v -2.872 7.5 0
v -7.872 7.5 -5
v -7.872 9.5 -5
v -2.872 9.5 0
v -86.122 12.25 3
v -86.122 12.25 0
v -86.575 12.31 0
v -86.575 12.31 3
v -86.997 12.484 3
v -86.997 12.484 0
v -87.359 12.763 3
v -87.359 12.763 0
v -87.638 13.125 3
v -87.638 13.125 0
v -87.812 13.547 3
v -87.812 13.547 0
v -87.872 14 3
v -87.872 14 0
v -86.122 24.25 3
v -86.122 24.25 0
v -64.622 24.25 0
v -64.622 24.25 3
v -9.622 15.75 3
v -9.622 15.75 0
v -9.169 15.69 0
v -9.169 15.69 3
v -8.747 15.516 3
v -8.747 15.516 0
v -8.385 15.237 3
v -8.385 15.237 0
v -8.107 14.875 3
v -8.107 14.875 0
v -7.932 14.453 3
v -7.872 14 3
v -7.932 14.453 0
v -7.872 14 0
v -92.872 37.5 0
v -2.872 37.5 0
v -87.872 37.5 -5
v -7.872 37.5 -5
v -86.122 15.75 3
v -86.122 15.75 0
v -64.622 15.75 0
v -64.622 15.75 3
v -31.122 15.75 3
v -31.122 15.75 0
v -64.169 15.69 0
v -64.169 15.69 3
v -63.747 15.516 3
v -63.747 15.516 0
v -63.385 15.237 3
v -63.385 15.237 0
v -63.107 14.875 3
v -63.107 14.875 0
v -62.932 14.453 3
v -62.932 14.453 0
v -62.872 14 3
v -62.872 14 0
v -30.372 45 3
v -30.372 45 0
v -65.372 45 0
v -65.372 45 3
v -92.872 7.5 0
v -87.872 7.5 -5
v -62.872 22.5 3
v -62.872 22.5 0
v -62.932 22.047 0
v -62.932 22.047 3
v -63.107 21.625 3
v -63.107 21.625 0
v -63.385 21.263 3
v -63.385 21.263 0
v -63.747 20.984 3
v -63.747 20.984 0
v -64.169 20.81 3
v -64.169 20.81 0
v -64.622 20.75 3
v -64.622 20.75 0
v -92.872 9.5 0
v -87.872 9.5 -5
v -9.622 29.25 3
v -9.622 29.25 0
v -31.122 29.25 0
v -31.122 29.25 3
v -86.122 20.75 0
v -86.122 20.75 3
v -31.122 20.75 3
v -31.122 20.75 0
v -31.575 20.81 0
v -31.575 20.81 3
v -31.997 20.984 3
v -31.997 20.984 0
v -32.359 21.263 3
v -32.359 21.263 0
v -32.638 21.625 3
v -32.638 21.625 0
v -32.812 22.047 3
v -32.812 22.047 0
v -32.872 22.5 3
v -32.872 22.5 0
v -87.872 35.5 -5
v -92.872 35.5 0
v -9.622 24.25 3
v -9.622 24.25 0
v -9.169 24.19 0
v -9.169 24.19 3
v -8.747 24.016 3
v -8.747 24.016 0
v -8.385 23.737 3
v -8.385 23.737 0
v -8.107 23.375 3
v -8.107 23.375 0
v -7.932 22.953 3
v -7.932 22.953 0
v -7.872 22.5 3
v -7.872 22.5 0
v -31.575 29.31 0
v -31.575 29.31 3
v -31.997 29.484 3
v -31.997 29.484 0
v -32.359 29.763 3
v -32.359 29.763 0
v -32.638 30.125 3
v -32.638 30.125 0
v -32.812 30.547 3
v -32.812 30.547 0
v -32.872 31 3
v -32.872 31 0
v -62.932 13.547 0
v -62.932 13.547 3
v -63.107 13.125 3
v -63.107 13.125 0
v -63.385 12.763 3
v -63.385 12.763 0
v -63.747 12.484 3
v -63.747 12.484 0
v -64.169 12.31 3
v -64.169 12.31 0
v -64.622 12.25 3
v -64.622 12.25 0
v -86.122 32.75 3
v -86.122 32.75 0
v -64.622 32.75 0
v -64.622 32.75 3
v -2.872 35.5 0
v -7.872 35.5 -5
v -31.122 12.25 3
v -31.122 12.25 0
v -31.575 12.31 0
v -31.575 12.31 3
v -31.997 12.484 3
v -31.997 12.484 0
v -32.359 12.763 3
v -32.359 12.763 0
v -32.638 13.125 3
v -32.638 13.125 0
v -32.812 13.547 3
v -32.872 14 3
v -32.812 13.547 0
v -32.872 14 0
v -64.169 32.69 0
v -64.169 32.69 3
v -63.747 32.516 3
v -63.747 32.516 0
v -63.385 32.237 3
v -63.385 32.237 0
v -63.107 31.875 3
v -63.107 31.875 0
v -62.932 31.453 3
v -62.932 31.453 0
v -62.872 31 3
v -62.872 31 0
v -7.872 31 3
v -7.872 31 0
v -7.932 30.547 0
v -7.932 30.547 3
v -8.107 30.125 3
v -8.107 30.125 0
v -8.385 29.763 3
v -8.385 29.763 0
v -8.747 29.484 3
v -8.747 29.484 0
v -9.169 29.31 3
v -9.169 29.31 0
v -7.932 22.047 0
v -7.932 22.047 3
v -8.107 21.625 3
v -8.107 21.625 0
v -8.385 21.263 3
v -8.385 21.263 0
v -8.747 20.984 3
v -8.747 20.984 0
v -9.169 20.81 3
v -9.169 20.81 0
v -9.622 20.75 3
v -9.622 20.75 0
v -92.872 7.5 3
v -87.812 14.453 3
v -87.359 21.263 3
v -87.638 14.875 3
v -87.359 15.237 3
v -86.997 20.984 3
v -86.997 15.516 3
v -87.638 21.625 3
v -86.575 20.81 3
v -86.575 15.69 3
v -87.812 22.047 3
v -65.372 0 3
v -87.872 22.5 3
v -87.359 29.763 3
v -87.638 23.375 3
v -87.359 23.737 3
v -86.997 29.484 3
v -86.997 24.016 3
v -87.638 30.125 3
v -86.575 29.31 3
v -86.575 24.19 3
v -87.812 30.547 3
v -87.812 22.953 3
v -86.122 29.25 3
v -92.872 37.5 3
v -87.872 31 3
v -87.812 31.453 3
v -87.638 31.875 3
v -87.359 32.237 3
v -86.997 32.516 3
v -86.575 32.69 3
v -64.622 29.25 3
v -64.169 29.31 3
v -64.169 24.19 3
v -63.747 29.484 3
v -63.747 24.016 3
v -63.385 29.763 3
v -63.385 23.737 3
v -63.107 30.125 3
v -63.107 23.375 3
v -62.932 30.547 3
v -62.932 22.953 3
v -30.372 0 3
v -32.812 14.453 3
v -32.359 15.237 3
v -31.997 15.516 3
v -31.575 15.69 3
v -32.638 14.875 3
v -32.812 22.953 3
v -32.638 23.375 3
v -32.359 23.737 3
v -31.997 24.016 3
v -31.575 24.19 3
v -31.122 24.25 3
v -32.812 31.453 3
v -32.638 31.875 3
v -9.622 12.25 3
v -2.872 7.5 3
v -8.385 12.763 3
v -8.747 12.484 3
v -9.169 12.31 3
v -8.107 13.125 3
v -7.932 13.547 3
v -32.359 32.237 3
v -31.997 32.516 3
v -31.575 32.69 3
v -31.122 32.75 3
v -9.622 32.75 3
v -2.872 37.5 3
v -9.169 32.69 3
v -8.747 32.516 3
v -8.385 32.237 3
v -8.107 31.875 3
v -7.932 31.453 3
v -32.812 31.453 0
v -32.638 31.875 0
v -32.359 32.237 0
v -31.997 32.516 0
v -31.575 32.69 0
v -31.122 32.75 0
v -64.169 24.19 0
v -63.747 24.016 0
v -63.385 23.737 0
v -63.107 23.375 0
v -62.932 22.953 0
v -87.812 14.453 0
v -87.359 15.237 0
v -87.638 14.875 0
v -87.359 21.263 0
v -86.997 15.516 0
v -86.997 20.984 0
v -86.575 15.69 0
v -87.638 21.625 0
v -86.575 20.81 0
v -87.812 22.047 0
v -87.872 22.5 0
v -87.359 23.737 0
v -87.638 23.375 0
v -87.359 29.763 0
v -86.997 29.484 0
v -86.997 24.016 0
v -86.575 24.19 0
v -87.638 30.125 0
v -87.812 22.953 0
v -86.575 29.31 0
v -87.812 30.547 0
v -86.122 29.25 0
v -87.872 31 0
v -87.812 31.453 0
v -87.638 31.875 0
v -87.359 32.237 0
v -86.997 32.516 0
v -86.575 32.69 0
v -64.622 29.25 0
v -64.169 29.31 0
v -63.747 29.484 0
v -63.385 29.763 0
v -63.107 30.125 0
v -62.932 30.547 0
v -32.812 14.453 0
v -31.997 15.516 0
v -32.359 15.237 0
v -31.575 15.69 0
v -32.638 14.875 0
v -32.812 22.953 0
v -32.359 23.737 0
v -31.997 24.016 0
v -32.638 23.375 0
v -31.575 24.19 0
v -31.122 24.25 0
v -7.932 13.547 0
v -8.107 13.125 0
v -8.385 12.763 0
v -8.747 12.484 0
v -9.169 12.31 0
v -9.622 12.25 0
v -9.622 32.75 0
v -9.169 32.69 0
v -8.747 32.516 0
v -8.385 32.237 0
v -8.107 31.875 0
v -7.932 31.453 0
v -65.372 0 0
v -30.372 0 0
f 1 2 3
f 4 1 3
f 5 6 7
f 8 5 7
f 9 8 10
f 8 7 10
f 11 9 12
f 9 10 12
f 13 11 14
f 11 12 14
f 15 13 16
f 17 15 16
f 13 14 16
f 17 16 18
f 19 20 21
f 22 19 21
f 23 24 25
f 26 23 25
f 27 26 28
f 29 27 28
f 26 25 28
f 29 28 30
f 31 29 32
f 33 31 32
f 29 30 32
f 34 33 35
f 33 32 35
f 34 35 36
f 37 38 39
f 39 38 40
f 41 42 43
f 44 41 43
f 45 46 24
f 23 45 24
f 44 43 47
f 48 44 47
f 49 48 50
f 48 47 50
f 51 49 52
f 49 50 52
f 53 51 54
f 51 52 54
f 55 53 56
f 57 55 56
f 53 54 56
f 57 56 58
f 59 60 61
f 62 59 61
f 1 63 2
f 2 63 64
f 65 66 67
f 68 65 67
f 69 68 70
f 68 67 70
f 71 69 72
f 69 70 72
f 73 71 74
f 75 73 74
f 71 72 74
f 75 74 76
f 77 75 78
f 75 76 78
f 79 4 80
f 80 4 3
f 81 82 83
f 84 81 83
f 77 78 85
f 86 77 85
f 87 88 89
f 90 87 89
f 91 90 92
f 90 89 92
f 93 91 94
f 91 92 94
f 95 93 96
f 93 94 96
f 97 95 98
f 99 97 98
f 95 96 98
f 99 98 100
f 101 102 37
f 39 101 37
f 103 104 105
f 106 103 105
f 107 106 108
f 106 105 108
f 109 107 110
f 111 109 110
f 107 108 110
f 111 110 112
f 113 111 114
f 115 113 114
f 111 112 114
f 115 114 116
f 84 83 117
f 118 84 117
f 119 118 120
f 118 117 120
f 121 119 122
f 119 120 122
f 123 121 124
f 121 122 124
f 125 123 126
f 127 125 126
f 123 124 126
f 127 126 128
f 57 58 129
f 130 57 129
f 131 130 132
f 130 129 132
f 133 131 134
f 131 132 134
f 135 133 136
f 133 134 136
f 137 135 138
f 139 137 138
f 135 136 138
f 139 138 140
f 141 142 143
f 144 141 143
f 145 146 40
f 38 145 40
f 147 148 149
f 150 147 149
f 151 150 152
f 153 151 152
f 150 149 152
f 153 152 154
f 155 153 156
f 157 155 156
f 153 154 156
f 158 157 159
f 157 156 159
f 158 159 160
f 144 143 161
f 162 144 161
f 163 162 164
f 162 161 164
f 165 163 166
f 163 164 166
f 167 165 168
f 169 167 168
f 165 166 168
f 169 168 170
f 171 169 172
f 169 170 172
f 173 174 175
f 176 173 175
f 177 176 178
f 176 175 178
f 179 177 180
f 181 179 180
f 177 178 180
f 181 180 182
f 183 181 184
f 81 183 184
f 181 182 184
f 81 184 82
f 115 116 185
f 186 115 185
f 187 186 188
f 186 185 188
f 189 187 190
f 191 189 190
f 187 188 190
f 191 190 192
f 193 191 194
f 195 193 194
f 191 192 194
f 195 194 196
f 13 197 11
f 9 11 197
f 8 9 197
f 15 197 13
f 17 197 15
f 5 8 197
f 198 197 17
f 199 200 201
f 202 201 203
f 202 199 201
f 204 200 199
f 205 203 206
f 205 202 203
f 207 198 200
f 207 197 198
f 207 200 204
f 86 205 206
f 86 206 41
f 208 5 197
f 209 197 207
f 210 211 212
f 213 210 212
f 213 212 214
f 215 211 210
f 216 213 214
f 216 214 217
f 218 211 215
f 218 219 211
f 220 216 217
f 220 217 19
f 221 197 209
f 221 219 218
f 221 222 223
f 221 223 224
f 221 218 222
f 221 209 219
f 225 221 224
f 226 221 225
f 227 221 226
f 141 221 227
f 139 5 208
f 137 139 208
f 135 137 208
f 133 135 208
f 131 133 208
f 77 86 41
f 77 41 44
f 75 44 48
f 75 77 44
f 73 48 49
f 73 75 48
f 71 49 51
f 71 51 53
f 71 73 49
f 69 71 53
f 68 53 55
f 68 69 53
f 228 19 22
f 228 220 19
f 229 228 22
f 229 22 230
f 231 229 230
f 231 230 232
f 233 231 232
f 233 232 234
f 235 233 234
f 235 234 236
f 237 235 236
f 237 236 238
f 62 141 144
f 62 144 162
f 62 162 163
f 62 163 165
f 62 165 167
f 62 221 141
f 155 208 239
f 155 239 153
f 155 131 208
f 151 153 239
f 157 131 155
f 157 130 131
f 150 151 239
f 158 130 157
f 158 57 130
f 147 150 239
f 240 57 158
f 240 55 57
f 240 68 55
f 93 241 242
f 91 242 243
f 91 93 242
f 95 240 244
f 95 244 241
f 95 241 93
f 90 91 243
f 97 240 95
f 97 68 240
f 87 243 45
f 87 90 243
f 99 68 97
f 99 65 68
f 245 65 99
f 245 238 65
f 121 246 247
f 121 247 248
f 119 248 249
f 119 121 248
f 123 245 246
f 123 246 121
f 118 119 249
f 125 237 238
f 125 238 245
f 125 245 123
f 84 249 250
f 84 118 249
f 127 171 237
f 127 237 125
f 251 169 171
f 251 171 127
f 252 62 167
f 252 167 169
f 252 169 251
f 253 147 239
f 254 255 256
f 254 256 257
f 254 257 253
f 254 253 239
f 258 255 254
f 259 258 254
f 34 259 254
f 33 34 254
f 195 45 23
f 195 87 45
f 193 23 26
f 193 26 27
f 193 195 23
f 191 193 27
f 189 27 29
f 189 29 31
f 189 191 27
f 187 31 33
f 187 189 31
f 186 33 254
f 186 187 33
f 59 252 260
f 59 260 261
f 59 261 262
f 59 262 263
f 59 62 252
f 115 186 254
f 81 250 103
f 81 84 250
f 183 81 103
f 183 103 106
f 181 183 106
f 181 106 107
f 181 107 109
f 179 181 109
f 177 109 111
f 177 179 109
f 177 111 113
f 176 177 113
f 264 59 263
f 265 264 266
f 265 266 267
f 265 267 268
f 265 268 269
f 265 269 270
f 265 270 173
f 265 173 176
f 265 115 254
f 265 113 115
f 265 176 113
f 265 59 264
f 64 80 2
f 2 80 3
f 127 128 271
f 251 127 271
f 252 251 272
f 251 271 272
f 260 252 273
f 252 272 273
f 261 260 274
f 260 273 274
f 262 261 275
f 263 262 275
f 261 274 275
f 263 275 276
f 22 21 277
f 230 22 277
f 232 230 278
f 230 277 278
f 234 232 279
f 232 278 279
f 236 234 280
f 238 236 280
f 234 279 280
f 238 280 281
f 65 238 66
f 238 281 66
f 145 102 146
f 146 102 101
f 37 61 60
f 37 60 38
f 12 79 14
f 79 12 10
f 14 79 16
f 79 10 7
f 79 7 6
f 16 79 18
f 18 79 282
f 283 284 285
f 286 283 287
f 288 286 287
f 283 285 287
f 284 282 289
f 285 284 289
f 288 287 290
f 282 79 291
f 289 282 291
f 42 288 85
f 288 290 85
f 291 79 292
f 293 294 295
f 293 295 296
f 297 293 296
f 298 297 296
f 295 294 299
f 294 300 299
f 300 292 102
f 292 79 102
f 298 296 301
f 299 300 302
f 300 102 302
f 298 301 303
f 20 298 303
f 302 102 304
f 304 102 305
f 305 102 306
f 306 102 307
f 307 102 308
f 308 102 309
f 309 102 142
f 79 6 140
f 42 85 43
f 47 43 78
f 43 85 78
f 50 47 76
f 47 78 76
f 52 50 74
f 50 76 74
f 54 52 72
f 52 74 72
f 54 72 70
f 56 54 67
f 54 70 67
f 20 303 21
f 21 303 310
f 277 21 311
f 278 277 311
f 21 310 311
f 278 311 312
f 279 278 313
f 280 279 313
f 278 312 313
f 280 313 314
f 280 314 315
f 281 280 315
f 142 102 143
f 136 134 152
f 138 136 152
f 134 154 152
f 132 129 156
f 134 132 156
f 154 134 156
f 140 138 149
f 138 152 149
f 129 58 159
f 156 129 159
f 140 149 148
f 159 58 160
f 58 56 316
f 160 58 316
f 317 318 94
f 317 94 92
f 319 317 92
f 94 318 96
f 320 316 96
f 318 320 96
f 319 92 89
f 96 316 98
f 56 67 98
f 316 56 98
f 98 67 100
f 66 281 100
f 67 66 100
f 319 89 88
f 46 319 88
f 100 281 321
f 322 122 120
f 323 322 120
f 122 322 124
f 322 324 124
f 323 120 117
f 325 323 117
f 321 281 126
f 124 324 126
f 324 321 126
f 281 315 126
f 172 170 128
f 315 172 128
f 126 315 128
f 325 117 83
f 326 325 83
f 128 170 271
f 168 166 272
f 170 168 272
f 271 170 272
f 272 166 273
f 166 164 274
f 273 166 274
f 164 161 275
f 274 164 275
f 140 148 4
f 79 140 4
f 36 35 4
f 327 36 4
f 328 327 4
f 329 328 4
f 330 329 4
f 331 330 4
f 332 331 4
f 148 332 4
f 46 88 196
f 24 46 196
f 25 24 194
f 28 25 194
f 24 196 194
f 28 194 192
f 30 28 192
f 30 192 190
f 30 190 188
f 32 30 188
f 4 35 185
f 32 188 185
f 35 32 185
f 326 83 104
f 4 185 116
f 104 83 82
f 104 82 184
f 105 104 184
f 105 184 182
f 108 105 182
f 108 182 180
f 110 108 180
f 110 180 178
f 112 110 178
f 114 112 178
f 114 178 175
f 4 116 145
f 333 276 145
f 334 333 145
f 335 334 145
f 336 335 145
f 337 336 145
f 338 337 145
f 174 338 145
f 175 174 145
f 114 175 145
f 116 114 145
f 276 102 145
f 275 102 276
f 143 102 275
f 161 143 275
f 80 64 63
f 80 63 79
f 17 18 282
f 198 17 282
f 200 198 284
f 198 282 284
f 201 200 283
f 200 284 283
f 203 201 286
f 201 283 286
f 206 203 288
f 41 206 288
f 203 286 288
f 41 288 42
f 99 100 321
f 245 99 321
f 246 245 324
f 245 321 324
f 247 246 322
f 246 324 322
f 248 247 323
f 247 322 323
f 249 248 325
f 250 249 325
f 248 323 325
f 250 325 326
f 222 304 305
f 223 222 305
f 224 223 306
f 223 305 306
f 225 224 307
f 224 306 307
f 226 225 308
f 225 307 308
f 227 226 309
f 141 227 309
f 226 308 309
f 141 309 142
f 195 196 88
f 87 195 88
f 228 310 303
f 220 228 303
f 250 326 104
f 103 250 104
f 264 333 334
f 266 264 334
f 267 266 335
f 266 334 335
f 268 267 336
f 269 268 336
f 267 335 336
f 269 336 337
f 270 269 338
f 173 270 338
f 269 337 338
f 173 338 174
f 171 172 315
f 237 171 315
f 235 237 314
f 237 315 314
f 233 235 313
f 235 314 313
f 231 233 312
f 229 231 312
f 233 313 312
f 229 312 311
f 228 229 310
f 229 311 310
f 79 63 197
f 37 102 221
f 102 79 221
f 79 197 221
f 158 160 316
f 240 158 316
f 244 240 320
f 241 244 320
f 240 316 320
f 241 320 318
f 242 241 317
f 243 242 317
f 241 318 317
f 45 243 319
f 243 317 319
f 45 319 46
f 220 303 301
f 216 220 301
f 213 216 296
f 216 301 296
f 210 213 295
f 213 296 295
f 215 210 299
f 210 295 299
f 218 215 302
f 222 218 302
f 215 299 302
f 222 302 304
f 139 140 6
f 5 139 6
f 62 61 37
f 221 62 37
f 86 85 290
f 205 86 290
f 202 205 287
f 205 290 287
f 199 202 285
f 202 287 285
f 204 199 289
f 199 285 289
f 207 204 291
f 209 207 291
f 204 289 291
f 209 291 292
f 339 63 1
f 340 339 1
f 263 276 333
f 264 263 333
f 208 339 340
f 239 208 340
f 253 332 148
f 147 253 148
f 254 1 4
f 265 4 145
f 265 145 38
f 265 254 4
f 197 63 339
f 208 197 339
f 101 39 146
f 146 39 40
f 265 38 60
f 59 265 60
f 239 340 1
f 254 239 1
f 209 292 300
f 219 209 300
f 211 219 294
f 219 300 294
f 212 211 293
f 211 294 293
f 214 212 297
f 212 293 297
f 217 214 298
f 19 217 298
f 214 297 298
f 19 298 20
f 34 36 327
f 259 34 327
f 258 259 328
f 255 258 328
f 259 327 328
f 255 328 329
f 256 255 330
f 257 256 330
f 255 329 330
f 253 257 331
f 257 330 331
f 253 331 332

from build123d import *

# Parameters (mm, degrees)
F0_W     = 45
F0_H     = 2
F1_DEPTH = 3
F2_DEPTH = 5
F3_SIZE  = 5


with BuildPart() as f1:
    # F0 (on Top) → F1 (new body)
    with BuildSketch(Plane.XY):
        Polygon((-47.8720533848, 45), (-65.3720533848, 45), (-92.8720533848, 37.5), (-47.8720533848, 37.5), align=None)
        Polygon((-30.3720533848, 45), (-47.8720533848, 45), (-47.8720533848, 37.5), (-2.8720533848, 37.5), align=None)
        with Locations((-70.3720533848, 36.5)):
            Rectangle(F0_W, F0_H)
        with Locations((-25.3720533848, 36.5)):
            Rectangle(F0_W, F0_H)
        with BuildLine():
            Line((-47.8720533848, 35.5), (-92.8720533848, 35.5))
            Line((-92.8720533848, 35.5), (-92.8720533848, 31))
            Line((-92.8720533848, 31), (-87.8720533848, 31))
            ThreePointArc((-87.8720533848, 31), (-87.3594902519, 32.2374368671), (-86.1220533848, 32.75))
            Line((-86.1220533848, 32.75), (-64.6220533848, 32.75))
            ThreePointArc((-64.6220533848, 32.75), (-63.3846165177, 32.2374368671), (-62.8720533848, 31))
            Line((-62.8720533848, 31), (-47.8720533848, 31))
            Line((-47.8720533848, 31), (-47.8720533848, 35.5))
        make_face()
        with BuildLine():
            Line((-2.8720533848, 35.5), (-47.8720533848, 35.5))
            Line((-47.8720533848, 35.5), (-47.8720533848, 31))
            Line((-47.8720533848, 31), (-32.8720533848, 31))
            ThreePointArc((-32.8720533848, 31), (-32.3594902519, 32.2374368671), (-31.1220533848, 32.75))
            Line((-31.1220533848, 32.75), (-9.6220533848, 32.75))
            ThreePointArc((-9.6220533848, 32.75), (-8.3846165177, 32.2374368671), (-7.8720533848, 31))
            Line((-7.8720533848, 31), (-2.8720533848, 31))
            Line((-2.8720533848, 31), (-2.8720533848, 35.5))
        make_face()
        with BuildLine():
            Line((-87.8720533848, 31), (-92.8720533848, 31))
            Line((-92.8720533848, 31), (-92.8720533848, 22.5))
            Line((-92.8720533848, 22.5), (-87.8720533848, 22.5))
            ThreePointArc((-87.8720533848, 22.5), (-87.3594902519, 23.7374368671), (-86.1220533848, 24.25))
            Line((-86.1220533848, 24.25), (-64.6220533848, 24.25))
            ThreePointArc((-64.6220533848, 24.25), (-63.3846165177, 23.7374368671), (-62.8720533848, 22.5))
            Line((-62.8720533848, 22.5), (-47.8720533848, 22.5))
            Line((-47.8720533848, 22.5), (-47.8720533848, 31))
            Line((-47.8720533848, 31), (-62.8720533848, 31))
            ThreePointArc((-62.8720533848, 31), (-63.3846165177, 29.7625631329), (-64.6220533848, 29.25))
            Line((-64.6220533848, 29.25), (-86.1220533848, 29.25))
            ThreePointArc((-86.1220533848, 29.25), (-87.3594902519, 29.7625631329), (-87.8720533848, 31))
        make_face()
        with BuildLine():
            Line((-32.8720533848, 31), (-47.8720533848, 31))
            Line((-47.8720533848, 31), (-47.8720533848, 22.5))
            Line((-47.8720533848, 22.5), (-32.8720533848, 22.5))
            ThreePointArc((-32.8720533848, 22.5), (-32.3594902519, 23.7374368671), (-31.1220533848, 24.25))
            Line((-31.1220533848, 24.25), (-9.6220533848, 24.25))
            ThreePointArc((-9.6220533848, 24.25), (-8.3846165177, 23.7374368671), (-7.8720533848, 22.5))
            Line((-7.8720533848, 22.5), (-2.8720533848, 22.5))
            Line((-2.8720533848, 22.5), (-2.8720533848, 31))
            Line((-2.8720533848, 31), (-7.8720533848, 31))
            ThreePointArc((-7.8720533848, 31), (-8.3846165177, 29.7625631329), (-9.6220533848, 29.25))
            Line((-9.6220533848, 29.25), (-31.1220533848, 29.25))
            ThreePointArc((-31.1220533848, 29.25), (-32.3594902519, 29.7625631329), (-32.8720533848, 31))
        make_face()
        with BuildLine():
            Line((-87.8720533848, 22.5), (-92.8720533848, 22.5))
            Line((-92.8720533848, 22.5), (-92.8720533848, 14))
            Line((-92.8720533848, 14), (-87.8720533848, 14))
            ThreePointArc((-87.8720533848, 14), (-87.3594902519, 15.2374368671), (-86.1220533848, 15.75))
            Line((-86.1220533848, 15.75), (-64.6220533848, 15.75))
            ThreePointArc((-64.6220533848, 15.75), (-63.3846165177, 15.2374368671), (-62.8720533848, 14))
            Line((-62.8720533848, 14), (-47.8720533848, 14))
            Line((-47.8720533848, 14), (-47.8720533848, 22.5))
            Line((-47.8720533848, 22.5), (-62.8720533848, 22.5))
            ThreePointArc((-62.8720533848, 22.5), (-63.3846165177, 21.2625631329), (-64.6220533848, 20.75))
            Line((-64.6220533848, 20.75), (-86.1220533848, 20.75))
            ThreePointArc((-86.1220533848, 20.75), (-87.3594902519, 21.2625631329), (-87.8720533848, 22.5))
        make_face()
        with BuildLine():
            Line((-32.8720533848, 22.5), (-47.8720533848, 22.5))
            Line((-47.8720533848, 22.5), (-47.8720533848, 14))
            Line((-47.8720533848, 14), (-32.8720533848, 14))
            ThreePointArc((-32.8720533848, 14), (-32.3594902519, 15.2374368671), (-31.1220533848, 15.75))
            Line((-31.1220533848, 15.75), (-9.6220533848, 15.75))
            ThreePointArc((-9.6220533848, 15.75), (-8.3846165177, 15.2374368671), (-7.8720533848, 14))
            Line((-7.8720533848, 14), (-2.8720533848, 14))
            Line((-2.8720533848, 14), (-2.8720533848, 22.5))
            Line((-2.8720533848, 22.5), (-7.8720533848, 22.5))
            ThreePointArc((-7.8720533848, 22.5), (-8.3846165177, 21.2625631329), (-9.6220533848, 20.75))
            Line((-9.6220533848, 20.75), (-31.1220533848, 20.75))
            ThreePointArc((-31.1220533848, 20.75), (-32.3594902519, 21.2625631329), (-32.8720533848, 22.5))
        make_face()
        with BuildLine():
            Line((-87.8720533848, 14), (-92.8720533848, 14))
            Line((-92.8720533848, 14), (-92.8720533848, 9.5))
            Line((-92.8720533848, 9.5), (-47.8720533848, 9.5))
            Line((-47.8720533848, 9.5), (-47.8720533848, 14))
            Line((-47.8720533848, 14), (-62.8720533848, 14))
            ThreePointArc((-62.8720533848, 14), (-63.3846165177, 12.7625631329), (-64.6220533848, 12.25))
            Line((-64.6220533848, 12.25), (-86.1220533848, 12.25))
            ThreePointArc((-86.1220533848, 12.25), (-87.3594902519, 12.7625631329), (-87.8720533848, 14))
        make_face()
        with BuildLine():
            Line((-32.8720533848, 14), (-47.8720533848, 14))
            Line((-47.8720533848, 14), (-47.8720533848, 9.5))
            Line((-47.8720533848, 9.5), (-2.8720533848, 9.5))
            Line((-2.8720533848, 9.5), (-2.8720533848, 14))
            Line((-2.8720533848, 14), (-7.8720533848, 14))
            ThreePointArc((-7.8720533848, 14), (-8.3846165177, 12.7625631329), (-9.6220533848, 12.25))
            Line((-9.6220533848, 12.25), (-31.1220533848, 12.25))
            ThreePointArc((-31.1220533848, 12.25), (-32.3594902519, 12.7625631329), (-32.8720533848, 14))
        make_face()
        with Locations((-70.3720533848, 8.5)):
            Rectangle(F0_W, F0_H)
        with Locations((-25.3720533848, 8.5)):
            Rectangle(F0_W, F0_H)
        Polygon((-47.8720533848, 7.5), (-92.8720533848, 7.5), (-65.3720533848, 0), (-47.8720533848, 0), align=None)
        Polygon((-2.8720533848, 7.5), (-47.8720533848, 7.5), (-47.8720533848, 0), (-30.3720533848, 0), align=None)
    extrude(amount=F1_DEPTH)

    # F0 (on Top) → F2 (join)
    with BuildSketch(Plane.XY):
        with Locations((-25.3720533848, 36.5)):
            Rectangle(F0_W, F0_H)
        with Locations((-70.3720533848, 36.5)):
            Rectangle(F0_W, F0_H)
        with Locations((-25.3720533848, 8.5)):
            Rectangle(F0_W, F0_H)
        with Locations((-70.3720533848, 8.5)):
            Rectangle(F0_W, F0_H)
    extrude(amount=-F2_DEPTH)

    # F3
    f3_edges = [f1.edges().sort_by_distance(p)[0] for p in [
        (-92.872053, 36.5, -5),
        (-92.872053, 8.5, -5),
        (-2.872053, 8.5, -5),
        (-2.872053, 36.5, -5),
    ]]
    chamfer(f3_edges, length=F3_SIZE)


solid = f1.part
